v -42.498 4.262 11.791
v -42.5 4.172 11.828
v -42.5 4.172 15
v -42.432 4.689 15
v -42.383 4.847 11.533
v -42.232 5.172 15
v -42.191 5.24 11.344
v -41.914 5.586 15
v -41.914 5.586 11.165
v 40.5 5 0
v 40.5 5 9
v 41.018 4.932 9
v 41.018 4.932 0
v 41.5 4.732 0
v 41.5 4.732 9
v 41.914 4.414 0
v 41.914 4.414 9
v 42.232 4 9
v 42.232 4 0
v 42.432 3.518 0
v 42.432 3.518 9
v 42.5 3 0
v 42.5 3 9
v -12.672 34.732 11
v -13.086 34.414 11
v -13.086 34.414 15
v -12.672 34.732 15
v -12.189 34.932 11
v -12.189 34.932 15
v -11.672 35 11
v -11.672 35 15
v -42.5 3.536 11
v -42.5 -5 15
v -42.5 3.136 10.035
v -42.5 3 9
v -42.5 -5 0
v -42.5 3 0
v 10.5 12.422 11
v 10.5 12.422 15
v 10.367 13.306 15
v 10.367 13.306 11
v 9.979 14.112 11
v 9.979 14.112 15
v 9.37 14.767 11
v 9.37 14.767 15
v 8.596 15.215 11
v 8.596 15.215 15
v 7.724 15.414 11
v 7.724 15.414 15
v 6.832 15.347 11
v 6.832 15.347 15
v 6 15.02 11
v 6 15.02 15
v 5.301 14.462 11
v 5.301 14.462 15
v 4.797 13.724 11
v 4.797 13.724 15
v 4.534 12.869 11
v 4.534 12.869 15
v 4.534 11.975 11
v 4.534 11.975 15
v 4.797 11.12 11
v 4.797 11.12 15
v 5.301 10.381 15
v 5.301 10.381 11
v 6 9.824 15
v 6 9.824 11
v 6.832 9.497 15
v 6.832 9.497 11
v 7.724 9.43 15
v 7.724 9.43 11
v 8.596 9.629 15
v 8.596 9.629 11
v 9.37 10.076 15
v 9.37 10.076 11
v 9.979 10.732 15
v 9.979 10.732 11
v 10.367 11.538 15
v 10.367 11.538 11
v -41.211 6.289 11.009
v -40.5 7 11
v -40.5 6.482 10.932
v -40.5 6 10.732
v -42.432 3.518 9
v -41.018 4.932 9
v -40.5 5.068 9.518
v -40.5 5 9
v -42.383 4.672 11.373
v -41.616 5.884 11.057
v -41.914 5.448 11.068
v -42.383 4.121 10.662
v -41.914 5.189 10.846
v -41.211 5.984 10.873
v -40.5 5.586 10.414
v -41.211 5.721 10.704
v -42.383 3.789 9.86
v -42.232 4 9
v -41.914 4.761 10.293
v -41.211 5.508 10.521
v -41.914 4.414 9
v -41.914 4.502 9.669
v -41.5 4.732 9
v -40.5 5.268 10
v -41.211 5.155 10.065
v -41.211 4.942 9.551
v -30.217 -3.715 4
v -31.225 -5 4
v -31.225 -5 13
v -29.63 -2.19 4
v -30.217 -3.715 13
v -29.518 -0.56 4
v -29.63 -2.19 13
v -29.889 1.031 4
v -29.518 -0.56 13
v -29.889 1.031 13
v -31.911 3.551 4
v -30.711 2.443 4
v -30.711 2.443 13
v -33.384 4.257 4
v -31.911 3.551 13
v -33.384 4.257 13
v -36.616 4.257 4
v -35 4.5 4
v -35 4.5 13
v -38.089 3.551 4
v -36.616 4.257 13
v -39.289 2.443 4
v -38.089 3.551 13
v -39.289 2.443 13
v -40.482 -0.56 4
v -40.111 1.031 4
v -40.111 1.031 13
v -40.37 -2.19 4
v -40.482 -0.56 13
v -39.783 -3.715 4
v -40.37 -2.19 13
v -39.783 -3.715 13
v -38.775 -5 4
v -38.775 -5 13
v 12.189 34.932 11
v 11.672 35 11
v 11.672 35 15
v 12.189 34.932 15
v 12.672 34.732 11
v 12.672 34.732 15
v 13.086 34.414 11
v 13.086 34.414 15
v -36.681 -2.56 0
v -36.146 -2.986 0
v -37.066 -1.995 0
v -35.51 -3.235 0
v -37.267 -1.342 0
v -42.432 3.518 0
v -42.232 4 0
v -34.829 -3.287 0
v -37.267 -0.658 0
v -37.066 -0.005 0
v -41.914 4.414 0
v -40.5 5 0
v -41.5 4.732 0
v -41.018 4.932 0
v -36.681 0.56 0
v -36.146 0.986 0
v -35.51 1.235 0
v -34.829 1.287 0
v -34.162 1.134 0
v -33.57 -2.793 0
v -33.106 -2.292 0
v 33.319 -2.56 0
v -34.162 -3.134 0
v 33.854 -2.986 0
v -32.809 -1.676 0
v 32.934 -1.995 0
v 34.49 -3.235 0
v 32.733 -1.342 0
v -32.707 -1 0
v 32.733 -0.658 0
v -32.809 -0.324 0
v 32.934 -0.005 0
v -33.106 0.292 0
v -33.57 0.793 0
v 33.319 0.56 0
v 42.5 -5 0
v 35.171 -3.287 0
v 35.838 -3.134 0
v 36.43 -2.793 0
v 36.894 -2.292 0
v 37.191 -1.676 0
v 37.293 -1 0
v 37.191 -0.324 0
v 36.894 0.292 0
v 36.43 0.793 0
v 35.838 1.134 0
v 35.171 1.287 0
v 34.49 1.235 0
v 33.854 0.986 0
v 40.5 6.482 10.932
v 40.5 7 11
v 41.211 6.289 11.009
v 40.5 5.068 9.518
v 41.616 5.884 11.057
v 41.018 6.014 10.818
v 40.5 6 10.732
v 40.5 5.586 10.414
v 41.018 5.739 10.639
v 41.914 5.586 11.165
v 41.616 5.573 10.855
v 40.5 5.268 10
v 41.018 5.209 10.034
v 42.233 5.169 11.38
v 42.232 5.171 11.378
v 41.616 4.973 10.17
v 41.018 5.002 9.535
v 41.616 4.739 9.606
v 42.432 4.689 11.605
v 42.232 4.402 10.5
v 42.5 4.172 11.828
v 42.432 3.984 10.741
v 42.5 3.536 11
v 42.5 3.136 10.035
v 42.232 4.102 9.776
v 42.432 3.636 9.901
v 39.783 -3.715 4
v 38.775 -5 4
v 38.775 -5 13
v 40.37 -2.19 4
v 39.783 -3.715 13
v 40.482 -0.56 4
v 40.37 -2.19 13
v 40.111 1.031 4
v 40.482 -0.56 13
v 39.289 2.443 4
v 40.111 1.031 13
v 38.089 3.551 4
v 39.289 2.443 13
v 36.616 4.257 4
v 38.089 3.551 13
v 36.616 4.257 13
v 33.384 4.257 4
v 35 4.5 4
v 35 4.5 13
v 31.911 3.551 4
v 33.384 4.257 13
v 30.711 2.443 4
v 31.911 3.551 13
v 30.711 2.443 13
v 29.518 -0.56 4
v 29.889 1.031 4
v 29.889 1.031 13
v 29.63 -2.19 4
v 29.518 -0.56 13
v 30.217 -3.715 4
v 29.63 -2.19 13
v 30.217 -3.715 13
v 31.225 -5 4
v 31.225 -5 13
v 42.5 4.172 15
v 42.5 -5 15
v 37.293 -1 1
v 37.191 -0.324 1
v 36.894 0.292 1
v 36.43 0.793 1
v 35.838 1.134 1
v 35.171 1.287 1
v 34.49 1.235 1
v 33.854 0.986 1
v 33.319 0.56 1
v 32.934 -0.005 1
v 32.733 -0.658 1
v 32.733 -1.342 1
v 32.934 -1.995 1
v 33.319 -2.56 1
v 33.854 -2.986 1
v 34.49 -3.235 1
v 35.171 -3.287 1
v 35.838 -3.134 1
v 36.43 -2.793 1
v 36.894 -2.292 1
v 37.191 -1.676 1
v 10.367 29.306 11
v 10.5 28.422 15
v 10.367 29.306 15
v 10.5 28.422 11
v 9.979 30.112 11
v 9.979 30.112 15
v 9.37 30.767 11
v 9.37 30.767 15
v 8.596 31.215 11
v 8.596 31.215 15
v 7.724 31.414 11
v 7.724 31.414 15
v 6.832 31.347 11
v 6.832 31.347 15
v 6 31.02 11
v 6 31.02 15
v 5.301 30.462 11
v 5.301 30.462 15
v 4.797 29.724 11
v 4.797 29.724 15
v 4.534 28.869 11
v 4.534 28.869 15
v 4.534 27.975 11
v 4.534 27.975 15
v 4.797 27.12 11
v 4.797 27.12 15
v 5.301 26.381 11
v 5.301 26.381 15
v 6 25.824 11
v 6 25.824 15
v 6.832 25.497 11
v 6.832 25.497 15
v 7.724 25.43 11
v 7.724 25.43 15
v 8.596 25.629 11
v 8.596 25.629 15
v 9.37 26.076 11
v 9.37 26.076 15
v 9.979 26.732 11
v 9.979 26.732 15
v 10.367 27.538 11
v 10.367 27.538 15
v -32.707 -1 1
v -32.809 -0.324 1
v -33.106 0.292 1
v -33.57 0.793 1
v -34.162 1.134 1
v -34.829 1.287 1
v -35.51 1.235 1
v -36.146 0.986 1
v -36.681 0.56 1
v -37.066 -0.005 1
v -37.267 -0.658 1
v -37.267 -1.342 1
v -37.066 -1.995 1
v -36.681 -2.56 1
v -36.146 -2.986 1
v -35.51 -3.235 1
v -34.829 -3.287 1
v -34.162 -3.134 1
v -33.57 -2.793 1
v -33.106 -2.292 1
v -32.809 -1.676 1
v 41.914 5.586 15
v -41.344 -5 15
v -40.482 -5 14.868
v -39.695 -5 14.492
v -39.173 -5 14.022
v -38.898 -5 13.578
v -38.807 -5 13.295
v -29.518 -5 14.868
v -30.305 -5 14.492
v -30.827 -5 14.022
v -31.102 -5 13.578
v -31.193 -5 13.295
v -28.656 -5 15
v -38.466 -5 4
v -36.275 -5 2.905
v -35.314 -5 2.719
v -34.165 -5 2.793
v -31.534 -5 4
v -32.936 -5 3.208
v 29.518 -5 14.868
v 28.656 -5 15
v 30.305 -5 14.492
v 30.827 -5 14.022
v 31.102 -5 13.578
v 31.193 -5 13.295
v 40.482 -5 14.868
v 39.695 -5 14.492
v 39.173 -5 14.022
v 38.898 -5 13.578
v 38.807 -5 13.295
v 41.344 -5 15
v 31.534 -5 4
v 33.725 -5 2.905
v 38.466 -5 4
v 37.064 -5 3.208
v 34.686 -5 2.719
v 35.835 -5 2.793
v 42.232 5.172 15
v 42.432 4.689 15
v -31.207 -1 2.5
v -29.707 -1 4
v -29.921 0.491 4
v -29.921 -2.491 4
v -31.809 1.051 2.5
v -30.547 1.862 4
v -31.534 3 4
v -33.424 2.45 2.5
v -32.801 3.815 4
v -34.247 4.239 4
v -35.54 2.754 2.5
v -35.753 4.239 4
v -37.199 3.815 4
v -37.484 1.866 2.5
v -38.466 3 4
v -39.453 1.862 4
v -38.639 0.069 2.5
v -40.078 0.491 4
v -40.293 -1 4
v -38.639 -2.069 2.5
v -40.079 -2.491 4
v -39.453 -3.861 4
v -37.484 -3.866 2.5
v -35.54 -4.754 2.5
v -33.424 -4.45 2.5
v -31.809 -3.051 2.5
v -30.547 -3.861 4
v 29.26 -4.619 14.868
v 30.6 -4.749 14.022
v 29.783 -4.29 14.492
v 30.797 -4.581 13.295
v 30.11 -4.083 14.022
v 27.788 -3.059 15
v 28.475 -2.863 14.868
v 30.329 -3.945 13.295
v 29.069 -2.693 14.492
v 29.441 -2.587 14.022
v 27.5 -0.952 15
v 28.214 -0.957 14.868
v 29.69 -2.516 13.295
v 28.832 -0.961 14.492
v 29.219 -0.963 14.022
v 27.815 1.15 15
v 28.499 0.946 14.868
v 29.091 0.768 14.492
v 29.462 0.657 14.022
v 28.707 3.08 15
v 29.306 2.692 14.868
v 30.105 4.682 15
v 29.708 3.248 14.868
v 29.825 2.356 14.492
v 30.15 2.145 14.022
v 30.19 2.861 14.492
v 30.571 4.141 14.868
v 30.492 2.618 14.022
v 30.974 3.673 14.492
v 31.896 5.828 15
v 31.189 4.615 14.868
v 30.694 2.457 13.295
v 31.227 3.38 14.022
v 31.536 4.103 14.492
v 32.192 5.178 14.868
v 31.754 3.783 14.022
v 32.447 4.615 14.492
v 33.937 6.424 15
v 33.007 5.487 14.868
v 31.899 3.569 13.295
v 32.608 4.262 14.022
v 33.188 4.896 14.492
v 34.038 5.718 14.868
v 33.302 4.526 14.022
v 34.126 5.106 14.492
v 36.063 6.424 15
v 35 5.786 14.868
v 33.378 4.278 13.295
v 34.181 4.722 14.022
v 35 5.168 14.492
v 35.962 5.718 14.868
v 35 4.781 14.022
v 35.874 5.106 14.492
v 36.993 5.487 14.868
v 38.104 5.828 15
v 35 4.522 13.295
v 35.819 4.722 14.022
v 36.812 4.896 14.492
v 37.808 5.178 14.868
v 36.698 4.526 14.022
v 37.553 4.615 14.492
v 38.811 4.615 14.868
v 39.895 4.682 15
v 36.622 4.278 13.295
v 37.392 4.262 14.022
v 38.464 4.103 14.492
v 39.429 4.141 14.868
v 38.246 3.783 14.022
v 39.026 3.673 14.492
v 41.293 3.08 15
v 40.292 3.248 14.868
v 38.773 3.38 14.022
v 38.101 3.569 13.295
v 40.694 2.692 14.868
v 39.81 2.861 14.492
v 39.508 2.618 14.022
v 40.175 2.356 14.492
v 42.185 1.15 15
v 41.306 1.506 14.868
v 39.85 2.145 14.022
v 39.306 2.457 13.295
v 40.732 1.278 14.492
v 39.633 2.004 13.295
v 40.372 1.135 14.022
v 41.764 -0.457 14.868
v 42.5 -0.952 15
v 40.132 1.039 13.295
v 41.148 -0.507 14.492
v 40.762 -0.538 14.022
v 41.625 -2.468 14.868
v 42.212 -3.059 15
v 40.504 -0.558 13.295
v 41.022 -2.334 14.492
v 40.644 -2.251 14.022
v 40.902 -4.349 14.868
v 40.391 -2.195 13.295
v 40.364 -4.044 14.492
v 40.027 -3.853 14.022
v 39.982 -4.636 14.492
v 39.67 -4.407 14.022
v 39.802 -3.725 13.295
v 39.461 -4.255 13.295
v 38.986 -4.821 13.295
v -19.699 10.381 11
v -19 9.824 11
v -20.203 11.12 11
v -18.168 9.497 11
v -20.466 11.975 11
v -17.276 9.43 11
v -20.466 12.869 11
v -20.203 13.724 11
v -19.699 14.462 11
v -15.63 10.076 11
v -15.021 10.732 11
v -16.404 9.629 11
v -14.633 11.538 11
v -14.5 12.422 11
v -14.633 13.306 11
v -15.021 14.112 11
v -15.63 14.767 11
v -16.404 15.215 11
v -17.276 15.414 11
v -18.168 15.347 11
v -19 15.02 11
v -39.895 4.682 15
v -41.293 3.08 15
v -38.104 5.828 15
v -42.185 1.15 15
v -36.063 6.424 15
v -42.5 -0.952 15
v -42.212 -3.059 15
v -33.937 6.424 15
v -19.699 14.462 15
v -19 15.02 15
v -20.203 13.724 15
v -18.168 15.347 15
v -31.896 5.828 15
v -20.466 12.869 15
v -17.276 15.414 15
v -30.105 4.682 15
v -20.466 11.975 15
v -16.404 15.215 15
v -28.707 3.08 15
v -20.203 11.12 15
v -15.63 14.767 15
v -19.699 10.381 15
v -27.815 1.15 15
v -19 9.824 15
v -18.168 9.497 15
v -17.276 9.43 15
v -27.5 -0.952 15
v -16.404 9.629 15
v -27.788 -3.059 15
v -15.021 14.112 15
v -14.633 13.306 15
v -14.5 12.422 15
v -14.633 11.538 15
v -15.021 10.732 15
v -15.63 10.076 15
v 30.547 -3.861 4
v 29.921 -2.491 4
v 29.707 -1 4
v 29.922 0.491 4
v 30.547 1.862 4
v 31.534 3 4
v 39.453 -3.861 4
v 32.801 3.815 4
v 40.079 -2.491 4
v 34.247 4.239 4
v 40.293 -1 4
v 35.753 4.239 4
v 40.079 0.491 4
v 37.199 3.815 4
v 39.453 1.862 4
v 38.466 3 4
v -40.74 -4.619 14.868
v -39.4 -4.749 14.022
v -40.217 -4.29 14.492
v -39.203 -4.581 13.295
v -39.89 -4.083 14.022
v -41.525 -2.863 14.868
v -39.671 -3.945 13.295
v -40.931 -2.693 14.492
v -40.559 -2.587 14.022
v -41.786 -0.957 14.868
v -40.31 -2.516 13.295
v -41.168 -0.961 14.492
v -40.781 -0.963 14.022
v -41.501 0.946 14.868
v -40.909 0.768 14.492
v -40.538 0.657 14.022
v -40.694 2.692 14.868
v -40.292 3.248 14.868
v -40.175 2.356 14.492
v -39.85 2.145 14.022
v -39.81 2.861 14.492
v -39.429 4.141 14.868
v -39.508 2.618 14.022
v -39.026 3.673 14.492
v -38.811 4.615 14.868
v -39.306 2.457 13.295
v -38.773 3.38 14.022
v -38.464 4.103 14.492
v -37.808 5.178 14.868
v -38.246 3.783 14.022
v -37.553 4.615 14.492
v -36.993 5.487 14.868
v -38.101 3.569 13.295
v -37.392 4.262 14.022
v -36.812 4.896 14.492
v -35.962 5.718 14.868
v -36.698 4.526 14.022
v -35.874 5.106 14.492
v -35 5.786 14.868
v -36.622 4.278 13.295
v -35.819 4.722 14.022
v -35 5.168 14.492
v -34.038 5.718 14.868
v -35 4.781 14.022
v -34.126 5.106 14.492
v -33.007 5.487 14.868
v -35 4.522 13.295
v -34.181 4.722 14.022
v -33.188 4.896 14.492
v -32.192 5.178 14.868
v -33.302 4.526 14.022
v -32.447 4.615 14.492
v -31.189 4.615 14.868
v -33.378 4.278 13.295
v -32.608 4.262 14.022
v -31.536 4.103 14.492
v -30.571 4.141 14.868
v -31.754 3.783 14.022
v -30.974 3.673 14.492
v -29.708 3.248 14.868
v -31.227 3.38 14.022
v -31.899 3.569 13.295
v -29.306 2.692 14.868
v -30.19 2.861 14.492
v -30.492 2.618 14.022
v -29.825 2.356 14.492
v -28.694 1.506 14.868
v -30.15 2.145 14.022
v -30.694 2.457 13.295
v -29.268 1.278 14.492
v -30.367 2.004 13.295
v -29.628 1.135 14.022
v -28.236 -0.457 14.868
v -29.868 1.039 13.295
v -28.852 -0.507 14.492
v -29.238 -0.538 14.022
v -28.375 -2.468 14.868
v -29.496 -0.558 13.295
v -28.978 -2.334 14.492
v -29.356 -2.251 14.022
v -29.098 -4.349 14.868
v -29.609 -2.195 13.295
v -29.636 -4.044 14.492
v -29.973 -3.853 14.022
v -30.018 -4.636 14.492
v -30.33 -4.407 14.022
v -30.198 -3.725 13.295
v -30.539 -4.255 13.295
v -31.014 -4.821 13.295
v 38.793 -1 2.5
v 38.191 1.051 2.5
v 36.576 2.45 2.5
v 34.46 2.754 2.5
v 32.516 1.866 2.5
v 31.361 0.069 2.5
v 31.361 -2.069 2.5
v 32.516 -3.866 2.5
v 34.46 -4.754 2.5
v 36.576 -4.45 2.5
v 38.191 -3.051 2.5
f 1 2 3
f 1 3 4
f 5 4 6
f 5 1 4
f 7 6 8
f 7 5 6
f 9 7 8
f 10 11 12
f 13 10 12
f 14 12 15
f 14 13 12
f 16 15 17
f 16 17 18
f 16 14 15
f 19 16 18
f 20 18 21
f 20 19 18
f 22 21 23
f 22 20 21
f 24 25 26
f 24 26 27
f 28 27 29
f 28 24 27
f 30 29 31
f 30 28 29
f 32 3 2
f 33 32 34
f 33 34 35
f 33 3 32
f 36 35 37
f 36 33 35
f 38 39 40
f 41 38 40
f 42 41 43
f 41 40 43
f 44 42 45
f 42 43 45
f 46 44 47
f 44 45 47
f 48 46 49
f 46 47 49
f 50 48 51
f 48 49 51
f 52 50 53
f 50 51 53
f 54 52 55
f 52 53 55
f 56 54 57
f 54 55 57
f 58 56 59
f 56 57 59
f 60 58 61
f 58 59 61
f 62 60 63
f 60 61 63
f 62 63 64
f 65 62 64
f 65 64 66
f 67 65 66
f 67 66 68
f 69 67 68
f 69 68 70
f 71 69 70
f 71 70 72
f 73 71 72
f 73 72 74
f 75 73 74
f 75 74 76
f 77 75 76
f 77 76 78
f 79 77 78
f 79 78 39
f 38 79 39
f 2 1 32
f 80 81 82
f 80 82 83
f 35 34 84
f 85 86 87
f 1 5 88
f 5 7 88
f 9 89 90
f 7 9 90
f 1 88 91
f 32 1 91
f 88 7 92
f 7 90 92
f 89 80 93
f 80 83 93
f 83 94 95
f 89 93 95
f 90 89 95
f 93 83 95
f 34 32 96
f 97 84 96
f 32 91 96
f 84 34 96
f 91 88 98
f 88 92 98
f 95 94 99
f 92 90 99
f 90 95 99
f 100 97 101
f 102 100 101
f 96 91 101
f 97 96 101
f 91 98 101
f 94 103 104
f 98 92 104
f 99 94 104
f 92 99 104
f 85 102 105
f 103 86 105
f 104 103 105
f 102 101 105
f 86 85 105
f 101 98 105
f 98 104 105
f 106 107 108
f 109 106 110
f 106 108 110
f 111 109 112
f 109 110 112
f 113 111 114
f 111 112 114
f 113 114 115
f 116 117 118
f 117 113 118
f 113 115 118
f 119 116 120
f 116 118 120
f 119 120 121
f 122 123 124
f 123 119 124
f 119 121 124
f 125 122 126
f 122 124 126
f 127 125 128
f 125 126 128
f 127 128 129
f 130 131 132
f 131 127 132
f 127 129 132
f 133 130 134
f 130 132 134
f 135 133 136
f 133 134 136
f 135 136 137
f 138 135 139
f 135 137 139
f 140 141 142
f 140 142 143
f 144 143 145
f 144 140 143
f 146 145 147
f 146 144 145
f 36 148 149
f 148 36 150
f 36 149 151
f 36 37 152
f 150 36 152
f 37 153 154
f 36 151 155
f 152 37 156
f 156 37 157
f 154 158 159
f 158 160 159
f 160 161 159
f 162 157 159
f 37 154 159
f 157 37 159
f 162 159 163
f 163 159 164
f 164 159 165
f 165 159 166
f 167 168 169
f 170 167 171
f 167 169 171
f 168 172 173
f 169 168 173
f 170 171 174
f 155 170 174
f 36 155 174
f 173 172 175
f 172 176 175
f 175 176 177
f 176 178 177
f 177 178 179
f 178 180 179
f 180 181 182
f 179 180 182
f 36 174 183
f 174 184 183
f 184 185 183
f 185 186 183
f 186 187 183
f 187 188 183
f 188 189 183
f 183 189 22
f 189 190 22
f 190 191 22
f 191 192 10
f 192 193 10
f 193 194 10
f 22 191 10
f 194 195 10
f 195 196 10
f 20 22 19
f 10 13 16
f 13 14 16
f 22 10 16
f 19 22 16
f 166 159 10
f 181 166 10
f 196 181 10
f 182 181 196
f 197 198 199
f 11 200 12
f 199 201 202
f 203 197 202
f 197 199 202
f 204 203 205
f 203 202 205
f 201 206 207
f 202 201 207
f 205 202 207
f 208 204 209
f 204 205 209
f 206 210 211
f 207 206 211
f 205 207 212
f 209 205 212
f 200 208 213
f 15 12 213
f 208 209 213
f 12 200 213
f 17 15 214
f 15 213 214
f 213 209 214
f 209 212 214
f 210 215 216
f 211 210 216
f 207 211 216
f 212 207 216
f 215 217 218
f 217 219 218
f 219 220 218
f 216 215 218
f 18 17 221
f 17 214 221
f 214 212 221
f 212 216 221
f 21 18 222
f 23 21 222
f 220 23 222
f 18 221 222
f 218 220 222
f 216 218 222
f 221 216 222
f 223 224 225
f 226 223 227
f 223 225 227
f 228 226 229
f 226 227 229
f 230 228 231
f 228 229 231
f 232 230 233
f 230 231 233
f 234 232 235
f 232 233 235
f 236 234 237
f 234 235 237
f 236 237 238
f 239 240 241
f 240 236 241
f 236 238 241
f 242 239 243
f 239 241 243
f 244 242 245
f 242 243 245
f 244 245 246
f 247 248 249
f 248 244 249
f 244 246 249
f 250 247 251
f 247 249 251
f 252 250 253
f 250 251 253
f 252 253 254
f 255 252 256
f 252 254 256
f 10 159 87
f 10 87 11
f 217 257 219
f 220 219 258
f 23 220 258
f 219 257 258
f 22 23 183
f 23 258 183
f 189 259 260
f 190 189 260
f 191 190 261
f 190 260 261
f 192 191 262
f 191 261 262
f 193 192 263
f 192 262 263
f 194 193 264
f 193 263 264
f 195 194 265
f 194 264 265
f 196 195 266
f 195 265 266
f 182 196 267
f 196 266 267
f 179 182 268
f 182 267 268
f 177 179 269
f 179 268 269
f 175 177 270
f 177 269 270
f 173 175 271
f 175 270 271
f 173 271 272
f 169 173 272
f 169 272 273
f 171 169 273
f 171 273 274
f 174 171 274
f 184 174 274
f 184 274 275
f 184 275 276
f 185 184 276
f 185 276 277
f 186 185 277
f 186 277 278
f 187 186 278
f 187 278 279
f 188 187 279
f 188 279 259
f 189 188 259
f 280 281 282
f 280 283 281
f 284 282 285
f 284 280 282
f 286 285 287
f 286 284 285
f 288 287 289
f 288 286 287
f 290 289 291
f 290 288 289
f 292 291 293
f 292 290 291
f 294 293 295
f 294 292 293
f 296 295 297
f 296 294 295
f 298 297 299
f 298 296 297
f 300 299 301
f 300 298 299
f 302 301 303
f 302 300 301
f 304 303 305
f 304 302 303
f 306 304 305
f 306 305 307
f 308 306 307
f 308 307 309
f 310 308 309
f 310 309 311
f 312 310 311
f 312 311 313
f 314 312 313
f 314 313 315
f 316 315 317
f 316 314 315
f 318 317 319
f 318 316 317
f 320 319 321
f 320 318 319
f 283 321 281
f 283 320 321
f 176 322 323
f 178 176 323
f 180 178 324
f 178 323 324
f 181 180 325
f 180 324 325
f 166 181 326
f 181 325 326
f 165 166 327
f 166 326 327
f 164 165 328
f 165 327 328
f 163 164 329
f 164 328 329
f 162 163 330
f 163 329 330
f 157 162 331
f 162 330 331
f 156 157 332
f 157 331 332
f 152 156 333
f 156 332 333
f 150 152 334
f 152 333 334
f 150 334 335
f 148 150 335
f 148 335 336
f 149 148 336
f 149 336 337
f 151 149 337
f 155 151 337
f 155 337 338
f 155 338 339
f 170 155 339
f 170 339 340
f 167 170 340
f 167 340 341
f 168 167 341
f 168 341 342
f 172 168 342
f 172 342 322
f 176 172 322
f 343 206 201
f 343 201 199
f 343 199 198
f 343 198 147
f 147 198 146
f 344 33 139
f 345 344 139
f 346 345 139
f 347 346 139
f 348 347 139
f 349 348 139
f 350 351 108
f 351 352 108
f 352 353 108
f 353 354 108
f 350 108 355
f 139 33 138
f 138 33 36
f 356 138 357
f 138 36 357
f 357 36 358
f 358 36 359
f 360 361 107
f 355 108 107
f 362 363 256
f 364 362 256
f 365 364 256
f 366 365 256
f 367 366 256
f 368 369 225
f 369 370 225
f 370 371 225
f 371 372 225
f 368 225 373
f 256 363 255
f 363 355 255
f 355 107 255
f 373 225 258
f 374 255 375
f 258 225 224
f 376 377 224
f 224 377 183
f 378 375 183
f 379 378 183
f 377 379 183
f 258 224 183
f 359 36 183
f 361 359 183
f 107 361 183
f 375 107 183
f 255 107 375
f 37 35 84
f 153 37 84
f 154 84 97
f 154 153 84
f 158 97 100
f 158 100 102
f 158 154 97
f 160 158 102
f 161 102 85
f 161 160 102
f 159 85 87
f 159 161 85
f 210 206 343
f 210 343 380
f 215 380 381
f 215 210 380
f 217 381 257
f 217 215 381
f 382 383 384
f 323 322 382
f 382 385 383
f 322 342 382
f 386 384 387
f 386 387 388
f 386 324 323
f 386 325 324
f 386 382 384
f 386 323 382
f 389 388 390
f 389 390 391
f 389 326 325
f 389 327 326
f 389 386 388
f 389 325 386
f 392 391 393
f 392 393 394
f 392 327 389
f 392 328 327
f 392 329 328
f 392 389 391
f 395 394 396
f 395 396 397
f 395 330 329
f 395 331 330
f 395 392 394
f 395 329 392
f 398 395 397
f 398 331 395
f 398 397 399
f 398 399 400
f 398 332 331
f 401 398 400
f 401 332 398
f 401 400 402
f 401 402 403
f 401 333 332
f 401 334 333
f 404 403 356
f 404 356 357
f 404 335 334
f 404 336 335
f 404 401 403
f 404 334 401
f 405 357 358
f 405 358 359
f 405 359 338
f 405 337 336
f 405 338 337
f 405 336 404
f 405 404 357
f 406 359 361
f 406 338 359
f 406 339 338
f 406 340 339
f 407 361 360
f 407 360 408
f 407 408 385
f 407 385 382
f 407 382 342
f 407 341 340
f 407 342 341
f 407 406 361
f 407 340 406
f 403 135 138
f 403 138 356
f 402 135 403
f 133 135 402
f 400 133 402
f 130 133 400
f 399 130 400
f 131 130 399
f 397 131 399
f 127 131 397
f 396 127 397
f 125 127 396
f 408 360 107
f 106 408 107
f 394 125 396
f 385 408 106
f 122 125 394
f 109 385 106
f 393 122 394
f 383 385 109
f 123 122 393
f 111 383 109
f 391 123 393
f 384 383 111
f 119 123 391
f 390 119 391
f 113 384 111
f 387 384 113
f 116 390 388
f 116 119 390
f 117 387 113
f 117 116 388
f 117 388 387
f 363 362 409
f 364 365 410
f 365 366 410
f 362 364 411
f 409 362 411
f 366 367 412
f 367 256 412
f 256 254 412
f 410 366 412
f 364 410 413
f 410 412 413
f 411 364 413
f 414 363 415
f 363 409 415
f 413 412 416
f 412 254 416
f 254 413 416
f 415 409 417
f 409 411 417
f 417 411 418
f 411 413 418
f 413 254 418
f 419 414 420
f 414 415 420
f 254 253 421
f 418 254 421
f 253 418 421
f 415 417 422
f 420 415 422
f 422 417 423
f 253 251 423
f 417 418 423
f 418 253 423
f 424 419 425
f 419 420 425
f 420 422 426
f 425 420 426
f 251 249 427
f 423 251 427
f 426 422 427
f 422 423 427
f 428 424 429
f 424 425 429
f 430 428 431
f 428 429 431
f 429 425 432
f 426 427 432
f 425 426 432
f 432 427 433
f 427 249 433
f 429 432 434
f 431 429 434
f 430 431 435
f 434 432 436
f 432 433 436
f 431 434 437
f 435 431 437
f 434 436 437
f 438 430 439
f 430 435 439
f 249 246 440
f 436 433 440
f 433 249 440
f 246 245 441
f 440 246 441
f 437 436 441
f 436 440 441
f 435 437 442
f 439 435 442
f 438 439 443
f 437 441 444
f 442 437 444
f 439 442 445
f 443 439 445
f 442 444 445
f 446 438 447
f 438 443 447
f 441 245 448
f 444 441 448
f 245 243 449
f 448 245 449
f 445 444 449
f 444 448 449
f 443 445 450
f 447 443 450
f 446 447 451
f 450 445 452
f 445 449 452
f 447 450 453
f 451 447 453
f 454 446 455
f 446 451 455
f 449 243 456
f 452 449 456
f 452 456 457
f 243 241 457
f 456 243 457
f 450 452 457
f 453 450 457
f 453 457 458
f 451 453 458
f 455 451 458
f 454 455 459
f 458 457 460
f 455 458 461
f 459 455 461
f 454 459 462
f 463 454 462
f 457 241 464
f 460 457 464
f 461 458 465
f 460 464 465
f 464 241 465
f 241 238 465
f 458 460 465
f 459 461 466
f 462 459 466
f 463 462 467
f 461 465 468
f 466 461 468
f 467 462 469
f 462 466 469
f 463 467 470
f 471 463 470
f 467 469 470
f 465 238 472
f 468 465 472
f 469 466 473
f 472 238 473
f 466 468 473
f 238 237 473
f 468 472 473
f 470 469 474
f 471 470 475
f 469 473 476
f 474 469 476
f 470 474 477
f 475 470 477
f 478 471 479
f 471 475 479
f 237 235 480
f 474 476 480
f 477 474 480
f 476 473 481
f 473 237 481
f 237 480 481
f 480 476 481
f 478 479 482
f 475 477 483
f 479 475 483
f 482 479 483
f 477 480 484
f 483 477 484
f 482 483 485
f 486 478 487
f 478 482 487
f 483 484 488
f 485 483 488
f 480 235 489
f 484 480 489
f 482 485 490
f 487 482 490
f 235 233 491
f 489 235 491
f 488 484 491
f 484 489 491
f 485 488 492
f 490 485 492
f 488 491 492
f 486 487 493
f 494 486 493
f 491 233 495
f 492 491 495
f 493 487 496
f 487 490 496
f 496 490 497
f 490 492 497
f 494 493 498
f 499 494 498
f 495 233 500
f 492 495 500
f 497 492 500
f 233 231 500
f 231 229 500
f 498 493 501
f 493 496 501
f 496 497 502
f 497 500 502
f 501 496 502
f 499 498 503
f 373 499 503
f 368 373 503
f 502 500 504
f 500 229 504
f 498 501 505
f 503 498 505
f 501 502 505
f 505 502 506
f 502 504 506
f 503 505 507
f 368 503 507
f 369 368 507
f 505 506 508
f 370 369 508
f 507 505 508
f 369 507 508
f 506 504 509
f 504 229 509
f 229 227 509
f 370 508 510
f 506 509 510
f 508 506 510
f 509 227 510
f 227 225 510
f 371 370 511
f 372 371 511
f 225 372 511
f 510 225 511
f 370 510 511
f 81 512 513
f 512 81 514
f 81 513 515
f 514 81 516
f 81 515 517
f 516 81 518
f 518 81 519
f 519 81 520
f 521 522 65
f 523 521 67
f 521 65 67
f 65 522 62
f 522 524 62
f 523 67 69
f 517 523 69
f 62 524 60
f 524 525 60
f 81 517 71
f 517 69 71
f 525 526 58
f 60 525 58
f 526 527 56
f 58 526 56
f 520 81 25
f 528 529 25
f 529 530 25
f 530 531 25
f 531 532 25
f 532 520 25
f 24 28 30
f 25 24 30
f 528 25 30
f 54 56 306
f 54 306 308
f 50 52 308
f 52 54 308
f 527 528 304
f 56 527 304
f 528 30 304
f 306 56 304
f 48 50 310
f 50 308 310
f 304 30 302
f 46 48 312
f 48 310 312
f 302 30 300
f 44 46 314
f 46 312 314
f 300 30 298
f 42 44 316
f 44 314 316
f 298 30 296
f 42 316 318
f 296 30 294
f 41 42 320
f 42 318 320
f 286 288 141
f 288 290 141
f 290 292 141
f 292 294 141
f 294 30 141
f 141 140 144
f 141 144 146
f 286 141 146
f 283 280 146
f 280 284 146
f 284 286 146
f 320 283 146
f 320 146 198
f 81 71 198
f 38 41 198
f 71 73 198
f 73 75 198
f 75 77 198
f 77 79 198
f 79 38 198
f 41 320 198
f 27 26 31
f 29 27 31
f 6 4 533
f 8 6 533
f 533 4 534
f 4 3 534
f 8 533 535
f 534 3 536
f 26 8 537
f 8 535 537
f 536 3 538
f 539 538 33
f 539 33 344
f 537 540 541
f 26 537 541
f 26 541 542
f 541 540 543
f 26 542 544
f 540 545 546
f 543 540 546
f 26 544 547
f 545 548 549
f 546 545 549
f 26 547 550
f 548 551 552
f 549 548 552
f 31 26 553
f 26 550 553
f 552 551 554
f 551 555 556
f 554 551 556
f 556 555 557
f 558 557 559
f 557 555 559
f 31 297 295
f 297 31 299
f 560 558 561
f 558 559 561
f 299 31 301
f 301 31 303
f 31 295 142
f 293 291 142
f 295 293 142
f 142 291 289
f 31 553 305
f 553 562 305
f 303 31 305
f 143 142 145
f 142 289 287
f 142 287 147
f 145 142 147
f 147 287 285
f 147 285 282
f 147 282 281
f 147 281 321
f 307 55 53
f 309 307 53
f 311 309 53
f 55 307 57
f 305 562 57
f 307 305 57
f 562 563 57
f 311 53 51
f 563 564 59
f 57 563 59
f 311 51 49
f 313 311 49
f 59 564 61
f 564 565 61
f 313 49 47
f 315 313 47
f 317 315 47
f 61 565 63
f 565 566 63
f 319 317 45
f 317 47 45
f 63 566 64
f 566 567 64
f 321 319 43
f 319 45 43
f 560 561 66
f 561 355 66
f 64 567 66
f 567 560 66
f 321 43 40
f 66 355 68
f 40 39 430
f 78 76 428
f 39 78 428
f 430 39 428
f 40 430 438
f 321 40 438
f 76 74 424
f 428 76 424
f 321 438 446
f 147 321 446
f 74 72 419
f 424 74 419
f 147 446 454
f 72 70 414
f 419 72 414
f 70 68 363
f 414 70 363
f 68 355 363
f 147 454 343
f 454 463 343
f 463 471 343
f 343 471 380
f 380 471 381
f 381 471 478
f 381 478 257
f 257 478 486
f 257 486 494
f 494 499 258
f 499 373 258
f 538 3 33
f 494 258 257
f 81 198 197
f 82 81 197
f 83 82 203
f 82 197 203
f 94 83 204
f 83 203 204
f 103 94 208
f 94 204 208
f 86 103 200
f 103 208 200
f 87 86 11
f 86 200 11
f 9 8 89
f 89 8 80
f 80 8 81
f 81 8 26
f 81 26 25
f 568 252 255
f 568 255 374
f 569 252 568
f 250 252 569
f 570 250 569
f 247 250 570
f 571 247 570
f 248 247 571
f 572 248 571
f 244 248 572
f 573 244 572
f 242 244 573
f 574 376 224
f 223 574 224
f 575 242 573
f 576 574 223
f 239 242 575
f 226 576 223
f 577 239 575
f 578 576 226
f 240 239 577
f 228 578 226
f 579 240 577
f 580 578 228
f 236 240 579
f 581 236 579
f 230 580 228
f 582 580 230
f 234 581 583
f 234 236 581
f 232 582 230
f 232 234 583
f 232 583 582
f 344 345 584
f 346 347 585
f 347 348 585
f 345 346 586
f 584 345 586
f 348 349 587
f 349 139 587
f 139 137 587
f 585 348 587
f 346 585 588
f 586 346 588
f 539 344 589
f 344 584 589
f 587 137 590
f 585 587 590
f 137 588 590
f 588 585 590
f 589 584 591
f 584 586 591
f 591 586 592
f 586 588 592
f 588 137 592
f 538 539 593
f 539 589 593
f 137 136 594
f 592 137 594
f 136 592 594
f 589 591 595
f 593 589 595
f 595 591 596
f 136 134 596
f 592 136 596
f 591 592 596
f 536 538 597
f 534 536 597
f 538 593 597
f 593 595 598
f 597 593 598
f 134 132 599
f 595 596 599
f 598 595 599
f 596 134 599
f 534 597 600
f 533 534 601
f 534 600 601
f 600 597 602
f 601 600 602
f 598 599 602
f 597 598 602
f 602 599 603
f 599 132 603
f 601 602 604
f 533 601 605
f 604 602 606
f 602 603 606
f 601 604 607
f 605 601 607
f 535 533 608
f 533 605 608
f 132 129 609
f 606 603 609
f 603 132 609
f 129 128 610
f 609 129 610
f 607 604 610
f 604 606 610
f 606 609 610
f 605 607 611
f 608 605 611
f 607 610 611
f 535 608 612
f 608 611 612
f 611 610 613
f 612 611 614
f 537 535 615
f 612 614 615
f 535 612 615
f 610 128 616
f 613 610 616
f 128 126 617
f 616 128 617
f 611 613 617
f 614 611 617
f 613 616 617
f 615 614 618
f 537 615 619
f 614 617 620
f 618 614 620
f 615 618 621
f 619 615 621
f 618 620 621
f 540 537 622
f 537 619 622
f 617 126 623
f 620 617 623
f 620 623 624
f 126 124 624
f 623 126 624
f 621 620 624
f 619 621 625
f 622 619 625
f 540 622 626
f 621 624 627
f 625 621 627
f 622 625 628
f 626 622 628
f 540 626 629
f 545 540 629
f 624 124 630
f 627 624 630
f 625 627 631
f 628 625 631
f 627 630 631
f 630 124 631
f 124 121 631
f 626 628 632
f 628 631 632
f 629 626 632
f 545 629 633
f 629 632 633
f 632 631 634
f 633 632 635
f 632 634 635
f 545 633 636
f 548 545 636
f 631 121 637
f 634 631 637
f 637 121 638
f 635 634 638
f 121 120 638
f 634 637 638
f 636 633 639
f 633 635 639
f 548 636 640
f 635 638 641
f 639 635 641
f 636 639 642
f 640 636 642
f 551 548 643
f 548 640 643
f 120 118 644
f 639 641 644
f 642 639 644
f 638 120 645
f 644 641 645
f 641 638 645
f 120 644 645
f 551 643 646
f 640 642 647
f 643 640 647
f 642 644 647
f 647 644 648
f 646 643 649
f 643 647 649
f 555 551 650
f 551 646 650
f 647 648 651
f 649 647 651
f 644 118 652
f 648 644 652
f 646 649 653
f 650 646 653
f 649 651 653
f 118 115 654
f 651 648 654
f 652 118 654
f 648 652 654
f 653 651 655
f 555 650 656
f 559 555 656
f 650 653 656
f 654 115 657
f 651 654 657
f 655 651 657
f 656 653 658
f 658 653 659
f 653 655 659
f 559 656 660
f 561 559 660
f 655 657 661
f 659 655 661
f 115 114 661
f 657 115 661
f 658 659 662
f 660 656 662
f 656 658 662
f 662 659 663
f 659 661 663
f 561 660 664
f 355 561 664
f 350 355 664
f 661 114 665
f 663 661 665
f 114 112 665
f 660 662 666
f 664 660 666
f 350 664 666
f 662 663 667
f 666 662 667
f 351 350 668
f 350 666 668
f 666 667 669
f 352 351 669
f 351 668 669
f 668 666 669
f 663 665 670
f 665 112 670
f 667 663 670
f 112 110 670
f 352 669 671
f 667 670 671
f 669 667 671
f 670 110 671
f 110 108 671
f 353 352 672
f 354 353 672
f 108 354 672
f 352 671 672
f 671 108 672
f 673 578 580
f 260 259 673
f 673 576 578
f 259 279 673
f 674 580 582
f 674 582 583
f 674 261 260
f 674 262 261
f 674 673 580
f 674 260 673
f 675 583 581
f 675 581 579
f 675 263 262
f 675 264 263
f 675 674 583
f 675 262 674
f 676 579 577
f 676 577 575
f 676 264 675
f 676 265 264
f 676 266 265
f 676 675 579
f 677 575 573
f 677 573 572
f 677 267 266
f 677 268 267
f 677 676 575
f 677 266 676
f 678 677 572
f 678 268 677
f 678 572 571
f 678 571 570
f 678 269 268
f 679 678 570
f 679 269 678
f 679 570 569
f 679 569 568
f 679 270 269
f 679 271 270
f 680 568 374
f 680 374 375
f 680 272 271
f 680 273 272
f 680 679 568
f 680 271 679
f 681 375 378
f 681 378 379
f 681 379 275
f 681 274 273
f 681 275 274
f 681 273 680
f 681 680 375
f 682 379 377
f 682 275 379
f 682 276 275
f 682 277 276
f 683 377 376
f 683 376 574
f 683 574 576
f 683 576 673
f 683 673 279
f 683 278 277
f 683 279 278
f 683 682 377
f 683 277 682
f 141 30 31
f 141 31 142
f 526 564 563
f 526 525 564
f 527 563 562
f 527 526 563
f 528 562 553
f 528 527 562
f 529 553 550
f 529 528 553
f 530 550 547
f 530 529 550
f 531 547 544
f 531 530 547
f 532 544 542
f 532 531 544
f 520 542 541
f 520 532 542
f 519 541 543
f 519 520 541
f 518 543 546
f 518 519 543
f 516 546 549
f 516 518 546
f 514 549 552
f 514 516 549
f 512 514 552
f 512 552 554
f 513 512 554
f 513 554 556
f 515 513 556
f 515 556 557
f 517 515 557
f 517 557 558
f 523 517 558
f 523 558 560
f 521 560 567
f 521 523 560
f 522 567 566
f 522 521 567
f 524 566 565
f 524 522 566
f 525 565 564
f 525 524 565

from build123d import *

# Parameters (mm, degrees)
SKETCH1_W           = 85
SKETCH1_H           = 10
BOSS_EXTRUDE1_DEPTH = 15
SKETCH3_R           = 2.292918
CUT_EXTRUDE1_DEPTH  = 100
LPATTERN1_COUNT     = 2
LPATTERN1_PITCH     = 70
SKETCH7_W           = 85
SKETCH7_H           = 4
BOSS_EXTRUDE5_DEPTH = 30
SKETCH8_R           = 3
CUT_EXTRUDE2_DEPTH  = 25
LPATTERN2_START     = 11
LPATTERN2_OUTLINE_R = 3
LPATTERN2_DEPTH     = 4
CHAMFER2_SIZE       = 30
FILLET3_START       = -1
FILLET3_DEPTH       = 10
FILLET3_START_2     = 1.5411
FILLET3_2_DEPTH     = 14.4589
FILLET3_START_3     = 9
FILLET3_3_DEPTH     = 2.164784
FILLET3_5_DEPTH     = 2
FILLET3_START_4     = 11
FILLET3_6_OUTLINE_R = 3
FILLET3_6_DEPTH     = 0.164784
SKETCH9_R           = 5.5
CUT_EXTRUDE7_DEPTH  = 11
LPATTERN3_COUNT     = 2
LPATTERN3_PITCH     = 70
CHAMFER3_SIZE       = 3
FILLET4_R           = 2


with BuildPart() as part:
    # Sketch1 → Boss-Extrude1 (new body)
    with BuildSketch(Plane.XY):
        Rectangle(SKETCH1_W, SKETCH1_H)
    extrude(amount=BOSS_EXTRUDE1_DEPTH)

    # Sketch3 → Cut-Extrude1 (cut)
    with BuildSketch(Plane.XY.offset(15)):
        with Locations((-35, -1)):
            Circle(SKETCH3_R)
    cut_extrude1 = extrude(amount=-CUT_EXTRUDE1_DEPTH, mode=Mode.SUBTRACT)

    # LPattern1: Cut-Extrude1 ×2
    with Locations(*[(i * LPATTERN1_PITCH, 0, 0) for i in range(1, LPATTERN1_COUNT)]):
        add(cut_extrude1, mode=Mode.SUBTRACT)

    # Sketch7 → Boss-Extrude5 (add)
    with BuildSketch(Plane(origin=(0, 5, 0), x_dir=(1, 0, 0), z_dir=(0, 1, 0))):
        with Locations((0, -13)):
            Rectangle(SKETCH7_W, SKETCH7_H)
    extrude(amount=BOSS_EXTRUDE5_DEPTH)

    # Sketch8 → Cut-Extrude2 (cut)
    with BuildSketch(Plane.XY.offset(15)):
        with Locations((7.5, 12.421962)):
            Circle(SKETCH8_R)
    extrude(amount=-CUT_EXTRUDE2_DEPTH, mode=Mode.SUBTRACT)

    # LPattern2: read off the stored shape, not the designer's step
    # LPattern2 outline → LPattern2 (cut)
    with BuildSketch(Plane.XY.offset(LPATTERN2_START)):
        with Locations((-17.5, 12.421962)):
            Circle(LPATTERN2_OUTLINE_R)
        with Locations((7.5, 28.421962)):
            Circle(LPATTERN2_OUTLINE_R)
    extrude(amount=LPATTERN2_DEPTH, mode=Mode.SUBTRACT)

    # Chamfer2
    chamfer2_edges = [part.edges().sort_by_distance(p)[0] for p in [
        (42.5, 35, 13),
        (-42.5, 35, 13),
    ]]
    chamfer(chamfer2_edges, length=CHAMFER2_SIZE)

    # Fillet3: read off the stored shape, not the designer's step
    # Fillet3 outline → Fillet3 (cut)
    with BuildSketch(Plane.XY.offset(FILLET3_START)):
        with BuildLine():
            ThreePointArc((40.5, 5), (41.914214, 4.414214), (42.5, 3))
            Line((42.5, 3), (42.5, 5))
            Line((42.5, 5), (40.5, 5))
        make_face()
        with BuildLine():
            ThreePointArc((-42.5, 3), (-41.914214, 4.414214), (-40.5, 5))
            Line((-40.5, 5), (-42.5, 5))
            Line((-42.5, 5), (-42.5, 3))
        make_face()
    extrude(amount=FILLET3_DEPTH, mode=Mode.SUBTRACT)

    # Fillet3 2 outline → Fillet3 2 (cut)
    with BuildSketch(Plane.XY.offset(FILLET3_START_2)):
        with BuildLine():
            Line((42.5, 4.171573), (42.5, 5))
            Line((42.5, 5), (41.914214, 5.585786))
            ThreePointArc((41.914214, 5.585786), (42.347759, 4.93694), (42.5, 4.171573))
        make_face()
        with BuildLine():
            Line((-41.914214, 5.585786), (-42.5, 5))
            Line((-42.5, 5), (-42.5, 4.171573))
            ThreePointArc((-42.5, 4.171573), (-42.347759, 4.93694), (-41.914214, 5.585786))
        make_face()
        with BuildLine():
            ThreePointArc((11.671573, 35), (12.43694, 34.847759), (13.085786, 34.414214))
            Line((13.085786, 34.414214), (12.5, 35))
            Line((12.5, 35), (11.671573, 35))
        make_face()
        with BuildLine():
            Line((-12.5, 35), (-13.085786, 34.414214))
            ThreePointArc((-13.085786, 34.414214), (-12.43694, 34.847759), (-11.671573, 35))
            Line((-11.671573, 35), (-12.5, 35))
        make_face()
    extrude(amount=FILLET3_2_DEPTH, mode=Mode.SUBTRACT)

    # Fillet3 3 outline → Fillet3 3 (add)
    with BuildSketch(Plane.XY.offset(FILLET3_START_3)):
        with BuildLine():
            Line((-42.320359, 5), (42.320359, 5))
            ThreePointArc((42.320359, 5), (42.143594, 5.311133), (41.914214, 5.585786))
            Line((41.914214, 5.585786), (13.085786, 34.414214))
            ThreePointArc((13.085786, 34.414214), (12.43694, 34.847759), (11.671573, 35))
            Line((11.671573, 35), (-11.671573, 35))
            ThreePointArc((-11.671573, 35), (-12.43694, 34.847759), (-13.085786, 34.414214))
            Line((-13.085786, 34.414214), (-41.914214, 5.585786))
            ThreePointArc((-41.914214, 5.585786), (-42.143594, 5.311133), (-42.320359, 5))
        make_face()
    extrude(amount=FILLET3_3_DEPTH)

    # Fillet3 4 outline → Fillet3 4 (revolve, cut)
    with BuildSketch(Plane(origin=(0, 7, 9), x_dir=(0, 1, 0), z_dir=(0, 0, -1))):
        with BuildLine():
            Line((4, 42.5), (0, 42.5))
            Line((0, 42.5), (0, -42.5))
            Line((0, -42.5), (4, -42.5))
            ThreePointArc((4, -42.5), (2.585786, -41.914214), (2, -40.5))
            Line((2, -40.5), (2, 40.5))
            ThreePointArc((2, 40.5), (2.585786, 41.914214), (4, 42.5))
        make_face()
    revolve(axis=Axis((0, 7, 9), (1, 0, 0)), mode=Mode.SUBTRACT)

    # Fillet3 5 outline → Fillet3 5 (cut)
    with BuildSketch(Plane.XY.offset(FILLET3_START_3)):
        with BuildLine():
            Line((11.671573, 35), (-11.671573, 35))
            ThreePointArc((-11.671573, 35), (-12.43694, 34.847759), (-13.085786, 34.414214))
            Line((-13.085786, 34.414214), (-40.5, 7))
            Line((-40.5, 7), (40.5, 7))
            Line((40.5, 7), (13.085786, 34.414214))
            ThreePointArc((13.085786, 34.414214), (12.43694, 34.847759), (11.671573, 35))
        make_face()
    extrude(amount=FILLET3_5_DEPTH, mode=Mode.SUBTRACT)

    # Fillet3 6 outline → Fillet3 6 (cut)
    with BuildSketch(Plane.XY.offset(FILLET3_START_4)):
        with Locations((7.5, 28.421962)):
            Circle(FILLET3_6_OUTLINE_R)
        with Locations((7.5, 12.421962)):
            Circle(FILLET3_6_OUTLINE_R)
        with Locations((-17.5, 12.421962)):
            Circle(FILLET3_6_OUTLINE_R)
    extrude(amount=FILLET3_6_DEPTH, mode=Mode.SUBTRACT)

    # Sketch9 → Cut-Extrude7 (cut)
    with BuildSketch(Plane.XY.offset(15)):
        with Locations((-35, -1)):
            Circle(SKETCH9_R)
    cut_extrude7 = extrude(amount=-CUT_EXTRUDE7_DEPTH, mode=Mode.SUBTRACT)

    # LPattern3: Cut-Extrude7 ×2
    with Locations(*[(i * LPATTERN3_PITCH, 0, 0) for i in range(1, LPATTERN3_COUNT)]):
        add(cut_extrude7, mode=Mode.SUBTRACT)

    # Chamfer3
    # the kernel refuses this chamfer: 3 mm, written as the material it takes off along each edge
    with BuildSketch(Plane(origin=(-35, -1, 4), x_dir=(1, 0, 0), z_dir=(0, -1, 0))) as chamfer3_piece_1:
        Polygon((2.292918 + CHAMFER3_SIZE, 0), (2.292918, -CHAMFER3_SIZE), (2.292918, 0), align=None)
    revolve(axis=Axis((-35, -1, 4), (0, 0, 1)), mode=Mode.SUBTRACT)
    with BuildSketch(Plane(origin=(35, -1, 4), x_dir=(1, 0, 0), z_dir=(0, -1, 0))) as chamfer3_piece_2:
        Polygon((2.292918 + CHAMFER3_SIZE, 0), (2.292918, -CHAMFER3_SIZE), (2.292918, 0), align=None)
    revolve(axis=Axis((35, -1, 4), (0, 0, 1)), mode=Mode.SUBTRACT)

    # Fillet4
    fillet4_edges = [part.edges().sort_by_distance(p)[0] for p in [
        (-35, 4.5, 15),
        (35, 4.5, 15),
    ]]
    fillet(fillet4_edges, radius=FILLET4_R - 0.0001)  # a hair under: the kernel refuses the full size


solid = part.part
